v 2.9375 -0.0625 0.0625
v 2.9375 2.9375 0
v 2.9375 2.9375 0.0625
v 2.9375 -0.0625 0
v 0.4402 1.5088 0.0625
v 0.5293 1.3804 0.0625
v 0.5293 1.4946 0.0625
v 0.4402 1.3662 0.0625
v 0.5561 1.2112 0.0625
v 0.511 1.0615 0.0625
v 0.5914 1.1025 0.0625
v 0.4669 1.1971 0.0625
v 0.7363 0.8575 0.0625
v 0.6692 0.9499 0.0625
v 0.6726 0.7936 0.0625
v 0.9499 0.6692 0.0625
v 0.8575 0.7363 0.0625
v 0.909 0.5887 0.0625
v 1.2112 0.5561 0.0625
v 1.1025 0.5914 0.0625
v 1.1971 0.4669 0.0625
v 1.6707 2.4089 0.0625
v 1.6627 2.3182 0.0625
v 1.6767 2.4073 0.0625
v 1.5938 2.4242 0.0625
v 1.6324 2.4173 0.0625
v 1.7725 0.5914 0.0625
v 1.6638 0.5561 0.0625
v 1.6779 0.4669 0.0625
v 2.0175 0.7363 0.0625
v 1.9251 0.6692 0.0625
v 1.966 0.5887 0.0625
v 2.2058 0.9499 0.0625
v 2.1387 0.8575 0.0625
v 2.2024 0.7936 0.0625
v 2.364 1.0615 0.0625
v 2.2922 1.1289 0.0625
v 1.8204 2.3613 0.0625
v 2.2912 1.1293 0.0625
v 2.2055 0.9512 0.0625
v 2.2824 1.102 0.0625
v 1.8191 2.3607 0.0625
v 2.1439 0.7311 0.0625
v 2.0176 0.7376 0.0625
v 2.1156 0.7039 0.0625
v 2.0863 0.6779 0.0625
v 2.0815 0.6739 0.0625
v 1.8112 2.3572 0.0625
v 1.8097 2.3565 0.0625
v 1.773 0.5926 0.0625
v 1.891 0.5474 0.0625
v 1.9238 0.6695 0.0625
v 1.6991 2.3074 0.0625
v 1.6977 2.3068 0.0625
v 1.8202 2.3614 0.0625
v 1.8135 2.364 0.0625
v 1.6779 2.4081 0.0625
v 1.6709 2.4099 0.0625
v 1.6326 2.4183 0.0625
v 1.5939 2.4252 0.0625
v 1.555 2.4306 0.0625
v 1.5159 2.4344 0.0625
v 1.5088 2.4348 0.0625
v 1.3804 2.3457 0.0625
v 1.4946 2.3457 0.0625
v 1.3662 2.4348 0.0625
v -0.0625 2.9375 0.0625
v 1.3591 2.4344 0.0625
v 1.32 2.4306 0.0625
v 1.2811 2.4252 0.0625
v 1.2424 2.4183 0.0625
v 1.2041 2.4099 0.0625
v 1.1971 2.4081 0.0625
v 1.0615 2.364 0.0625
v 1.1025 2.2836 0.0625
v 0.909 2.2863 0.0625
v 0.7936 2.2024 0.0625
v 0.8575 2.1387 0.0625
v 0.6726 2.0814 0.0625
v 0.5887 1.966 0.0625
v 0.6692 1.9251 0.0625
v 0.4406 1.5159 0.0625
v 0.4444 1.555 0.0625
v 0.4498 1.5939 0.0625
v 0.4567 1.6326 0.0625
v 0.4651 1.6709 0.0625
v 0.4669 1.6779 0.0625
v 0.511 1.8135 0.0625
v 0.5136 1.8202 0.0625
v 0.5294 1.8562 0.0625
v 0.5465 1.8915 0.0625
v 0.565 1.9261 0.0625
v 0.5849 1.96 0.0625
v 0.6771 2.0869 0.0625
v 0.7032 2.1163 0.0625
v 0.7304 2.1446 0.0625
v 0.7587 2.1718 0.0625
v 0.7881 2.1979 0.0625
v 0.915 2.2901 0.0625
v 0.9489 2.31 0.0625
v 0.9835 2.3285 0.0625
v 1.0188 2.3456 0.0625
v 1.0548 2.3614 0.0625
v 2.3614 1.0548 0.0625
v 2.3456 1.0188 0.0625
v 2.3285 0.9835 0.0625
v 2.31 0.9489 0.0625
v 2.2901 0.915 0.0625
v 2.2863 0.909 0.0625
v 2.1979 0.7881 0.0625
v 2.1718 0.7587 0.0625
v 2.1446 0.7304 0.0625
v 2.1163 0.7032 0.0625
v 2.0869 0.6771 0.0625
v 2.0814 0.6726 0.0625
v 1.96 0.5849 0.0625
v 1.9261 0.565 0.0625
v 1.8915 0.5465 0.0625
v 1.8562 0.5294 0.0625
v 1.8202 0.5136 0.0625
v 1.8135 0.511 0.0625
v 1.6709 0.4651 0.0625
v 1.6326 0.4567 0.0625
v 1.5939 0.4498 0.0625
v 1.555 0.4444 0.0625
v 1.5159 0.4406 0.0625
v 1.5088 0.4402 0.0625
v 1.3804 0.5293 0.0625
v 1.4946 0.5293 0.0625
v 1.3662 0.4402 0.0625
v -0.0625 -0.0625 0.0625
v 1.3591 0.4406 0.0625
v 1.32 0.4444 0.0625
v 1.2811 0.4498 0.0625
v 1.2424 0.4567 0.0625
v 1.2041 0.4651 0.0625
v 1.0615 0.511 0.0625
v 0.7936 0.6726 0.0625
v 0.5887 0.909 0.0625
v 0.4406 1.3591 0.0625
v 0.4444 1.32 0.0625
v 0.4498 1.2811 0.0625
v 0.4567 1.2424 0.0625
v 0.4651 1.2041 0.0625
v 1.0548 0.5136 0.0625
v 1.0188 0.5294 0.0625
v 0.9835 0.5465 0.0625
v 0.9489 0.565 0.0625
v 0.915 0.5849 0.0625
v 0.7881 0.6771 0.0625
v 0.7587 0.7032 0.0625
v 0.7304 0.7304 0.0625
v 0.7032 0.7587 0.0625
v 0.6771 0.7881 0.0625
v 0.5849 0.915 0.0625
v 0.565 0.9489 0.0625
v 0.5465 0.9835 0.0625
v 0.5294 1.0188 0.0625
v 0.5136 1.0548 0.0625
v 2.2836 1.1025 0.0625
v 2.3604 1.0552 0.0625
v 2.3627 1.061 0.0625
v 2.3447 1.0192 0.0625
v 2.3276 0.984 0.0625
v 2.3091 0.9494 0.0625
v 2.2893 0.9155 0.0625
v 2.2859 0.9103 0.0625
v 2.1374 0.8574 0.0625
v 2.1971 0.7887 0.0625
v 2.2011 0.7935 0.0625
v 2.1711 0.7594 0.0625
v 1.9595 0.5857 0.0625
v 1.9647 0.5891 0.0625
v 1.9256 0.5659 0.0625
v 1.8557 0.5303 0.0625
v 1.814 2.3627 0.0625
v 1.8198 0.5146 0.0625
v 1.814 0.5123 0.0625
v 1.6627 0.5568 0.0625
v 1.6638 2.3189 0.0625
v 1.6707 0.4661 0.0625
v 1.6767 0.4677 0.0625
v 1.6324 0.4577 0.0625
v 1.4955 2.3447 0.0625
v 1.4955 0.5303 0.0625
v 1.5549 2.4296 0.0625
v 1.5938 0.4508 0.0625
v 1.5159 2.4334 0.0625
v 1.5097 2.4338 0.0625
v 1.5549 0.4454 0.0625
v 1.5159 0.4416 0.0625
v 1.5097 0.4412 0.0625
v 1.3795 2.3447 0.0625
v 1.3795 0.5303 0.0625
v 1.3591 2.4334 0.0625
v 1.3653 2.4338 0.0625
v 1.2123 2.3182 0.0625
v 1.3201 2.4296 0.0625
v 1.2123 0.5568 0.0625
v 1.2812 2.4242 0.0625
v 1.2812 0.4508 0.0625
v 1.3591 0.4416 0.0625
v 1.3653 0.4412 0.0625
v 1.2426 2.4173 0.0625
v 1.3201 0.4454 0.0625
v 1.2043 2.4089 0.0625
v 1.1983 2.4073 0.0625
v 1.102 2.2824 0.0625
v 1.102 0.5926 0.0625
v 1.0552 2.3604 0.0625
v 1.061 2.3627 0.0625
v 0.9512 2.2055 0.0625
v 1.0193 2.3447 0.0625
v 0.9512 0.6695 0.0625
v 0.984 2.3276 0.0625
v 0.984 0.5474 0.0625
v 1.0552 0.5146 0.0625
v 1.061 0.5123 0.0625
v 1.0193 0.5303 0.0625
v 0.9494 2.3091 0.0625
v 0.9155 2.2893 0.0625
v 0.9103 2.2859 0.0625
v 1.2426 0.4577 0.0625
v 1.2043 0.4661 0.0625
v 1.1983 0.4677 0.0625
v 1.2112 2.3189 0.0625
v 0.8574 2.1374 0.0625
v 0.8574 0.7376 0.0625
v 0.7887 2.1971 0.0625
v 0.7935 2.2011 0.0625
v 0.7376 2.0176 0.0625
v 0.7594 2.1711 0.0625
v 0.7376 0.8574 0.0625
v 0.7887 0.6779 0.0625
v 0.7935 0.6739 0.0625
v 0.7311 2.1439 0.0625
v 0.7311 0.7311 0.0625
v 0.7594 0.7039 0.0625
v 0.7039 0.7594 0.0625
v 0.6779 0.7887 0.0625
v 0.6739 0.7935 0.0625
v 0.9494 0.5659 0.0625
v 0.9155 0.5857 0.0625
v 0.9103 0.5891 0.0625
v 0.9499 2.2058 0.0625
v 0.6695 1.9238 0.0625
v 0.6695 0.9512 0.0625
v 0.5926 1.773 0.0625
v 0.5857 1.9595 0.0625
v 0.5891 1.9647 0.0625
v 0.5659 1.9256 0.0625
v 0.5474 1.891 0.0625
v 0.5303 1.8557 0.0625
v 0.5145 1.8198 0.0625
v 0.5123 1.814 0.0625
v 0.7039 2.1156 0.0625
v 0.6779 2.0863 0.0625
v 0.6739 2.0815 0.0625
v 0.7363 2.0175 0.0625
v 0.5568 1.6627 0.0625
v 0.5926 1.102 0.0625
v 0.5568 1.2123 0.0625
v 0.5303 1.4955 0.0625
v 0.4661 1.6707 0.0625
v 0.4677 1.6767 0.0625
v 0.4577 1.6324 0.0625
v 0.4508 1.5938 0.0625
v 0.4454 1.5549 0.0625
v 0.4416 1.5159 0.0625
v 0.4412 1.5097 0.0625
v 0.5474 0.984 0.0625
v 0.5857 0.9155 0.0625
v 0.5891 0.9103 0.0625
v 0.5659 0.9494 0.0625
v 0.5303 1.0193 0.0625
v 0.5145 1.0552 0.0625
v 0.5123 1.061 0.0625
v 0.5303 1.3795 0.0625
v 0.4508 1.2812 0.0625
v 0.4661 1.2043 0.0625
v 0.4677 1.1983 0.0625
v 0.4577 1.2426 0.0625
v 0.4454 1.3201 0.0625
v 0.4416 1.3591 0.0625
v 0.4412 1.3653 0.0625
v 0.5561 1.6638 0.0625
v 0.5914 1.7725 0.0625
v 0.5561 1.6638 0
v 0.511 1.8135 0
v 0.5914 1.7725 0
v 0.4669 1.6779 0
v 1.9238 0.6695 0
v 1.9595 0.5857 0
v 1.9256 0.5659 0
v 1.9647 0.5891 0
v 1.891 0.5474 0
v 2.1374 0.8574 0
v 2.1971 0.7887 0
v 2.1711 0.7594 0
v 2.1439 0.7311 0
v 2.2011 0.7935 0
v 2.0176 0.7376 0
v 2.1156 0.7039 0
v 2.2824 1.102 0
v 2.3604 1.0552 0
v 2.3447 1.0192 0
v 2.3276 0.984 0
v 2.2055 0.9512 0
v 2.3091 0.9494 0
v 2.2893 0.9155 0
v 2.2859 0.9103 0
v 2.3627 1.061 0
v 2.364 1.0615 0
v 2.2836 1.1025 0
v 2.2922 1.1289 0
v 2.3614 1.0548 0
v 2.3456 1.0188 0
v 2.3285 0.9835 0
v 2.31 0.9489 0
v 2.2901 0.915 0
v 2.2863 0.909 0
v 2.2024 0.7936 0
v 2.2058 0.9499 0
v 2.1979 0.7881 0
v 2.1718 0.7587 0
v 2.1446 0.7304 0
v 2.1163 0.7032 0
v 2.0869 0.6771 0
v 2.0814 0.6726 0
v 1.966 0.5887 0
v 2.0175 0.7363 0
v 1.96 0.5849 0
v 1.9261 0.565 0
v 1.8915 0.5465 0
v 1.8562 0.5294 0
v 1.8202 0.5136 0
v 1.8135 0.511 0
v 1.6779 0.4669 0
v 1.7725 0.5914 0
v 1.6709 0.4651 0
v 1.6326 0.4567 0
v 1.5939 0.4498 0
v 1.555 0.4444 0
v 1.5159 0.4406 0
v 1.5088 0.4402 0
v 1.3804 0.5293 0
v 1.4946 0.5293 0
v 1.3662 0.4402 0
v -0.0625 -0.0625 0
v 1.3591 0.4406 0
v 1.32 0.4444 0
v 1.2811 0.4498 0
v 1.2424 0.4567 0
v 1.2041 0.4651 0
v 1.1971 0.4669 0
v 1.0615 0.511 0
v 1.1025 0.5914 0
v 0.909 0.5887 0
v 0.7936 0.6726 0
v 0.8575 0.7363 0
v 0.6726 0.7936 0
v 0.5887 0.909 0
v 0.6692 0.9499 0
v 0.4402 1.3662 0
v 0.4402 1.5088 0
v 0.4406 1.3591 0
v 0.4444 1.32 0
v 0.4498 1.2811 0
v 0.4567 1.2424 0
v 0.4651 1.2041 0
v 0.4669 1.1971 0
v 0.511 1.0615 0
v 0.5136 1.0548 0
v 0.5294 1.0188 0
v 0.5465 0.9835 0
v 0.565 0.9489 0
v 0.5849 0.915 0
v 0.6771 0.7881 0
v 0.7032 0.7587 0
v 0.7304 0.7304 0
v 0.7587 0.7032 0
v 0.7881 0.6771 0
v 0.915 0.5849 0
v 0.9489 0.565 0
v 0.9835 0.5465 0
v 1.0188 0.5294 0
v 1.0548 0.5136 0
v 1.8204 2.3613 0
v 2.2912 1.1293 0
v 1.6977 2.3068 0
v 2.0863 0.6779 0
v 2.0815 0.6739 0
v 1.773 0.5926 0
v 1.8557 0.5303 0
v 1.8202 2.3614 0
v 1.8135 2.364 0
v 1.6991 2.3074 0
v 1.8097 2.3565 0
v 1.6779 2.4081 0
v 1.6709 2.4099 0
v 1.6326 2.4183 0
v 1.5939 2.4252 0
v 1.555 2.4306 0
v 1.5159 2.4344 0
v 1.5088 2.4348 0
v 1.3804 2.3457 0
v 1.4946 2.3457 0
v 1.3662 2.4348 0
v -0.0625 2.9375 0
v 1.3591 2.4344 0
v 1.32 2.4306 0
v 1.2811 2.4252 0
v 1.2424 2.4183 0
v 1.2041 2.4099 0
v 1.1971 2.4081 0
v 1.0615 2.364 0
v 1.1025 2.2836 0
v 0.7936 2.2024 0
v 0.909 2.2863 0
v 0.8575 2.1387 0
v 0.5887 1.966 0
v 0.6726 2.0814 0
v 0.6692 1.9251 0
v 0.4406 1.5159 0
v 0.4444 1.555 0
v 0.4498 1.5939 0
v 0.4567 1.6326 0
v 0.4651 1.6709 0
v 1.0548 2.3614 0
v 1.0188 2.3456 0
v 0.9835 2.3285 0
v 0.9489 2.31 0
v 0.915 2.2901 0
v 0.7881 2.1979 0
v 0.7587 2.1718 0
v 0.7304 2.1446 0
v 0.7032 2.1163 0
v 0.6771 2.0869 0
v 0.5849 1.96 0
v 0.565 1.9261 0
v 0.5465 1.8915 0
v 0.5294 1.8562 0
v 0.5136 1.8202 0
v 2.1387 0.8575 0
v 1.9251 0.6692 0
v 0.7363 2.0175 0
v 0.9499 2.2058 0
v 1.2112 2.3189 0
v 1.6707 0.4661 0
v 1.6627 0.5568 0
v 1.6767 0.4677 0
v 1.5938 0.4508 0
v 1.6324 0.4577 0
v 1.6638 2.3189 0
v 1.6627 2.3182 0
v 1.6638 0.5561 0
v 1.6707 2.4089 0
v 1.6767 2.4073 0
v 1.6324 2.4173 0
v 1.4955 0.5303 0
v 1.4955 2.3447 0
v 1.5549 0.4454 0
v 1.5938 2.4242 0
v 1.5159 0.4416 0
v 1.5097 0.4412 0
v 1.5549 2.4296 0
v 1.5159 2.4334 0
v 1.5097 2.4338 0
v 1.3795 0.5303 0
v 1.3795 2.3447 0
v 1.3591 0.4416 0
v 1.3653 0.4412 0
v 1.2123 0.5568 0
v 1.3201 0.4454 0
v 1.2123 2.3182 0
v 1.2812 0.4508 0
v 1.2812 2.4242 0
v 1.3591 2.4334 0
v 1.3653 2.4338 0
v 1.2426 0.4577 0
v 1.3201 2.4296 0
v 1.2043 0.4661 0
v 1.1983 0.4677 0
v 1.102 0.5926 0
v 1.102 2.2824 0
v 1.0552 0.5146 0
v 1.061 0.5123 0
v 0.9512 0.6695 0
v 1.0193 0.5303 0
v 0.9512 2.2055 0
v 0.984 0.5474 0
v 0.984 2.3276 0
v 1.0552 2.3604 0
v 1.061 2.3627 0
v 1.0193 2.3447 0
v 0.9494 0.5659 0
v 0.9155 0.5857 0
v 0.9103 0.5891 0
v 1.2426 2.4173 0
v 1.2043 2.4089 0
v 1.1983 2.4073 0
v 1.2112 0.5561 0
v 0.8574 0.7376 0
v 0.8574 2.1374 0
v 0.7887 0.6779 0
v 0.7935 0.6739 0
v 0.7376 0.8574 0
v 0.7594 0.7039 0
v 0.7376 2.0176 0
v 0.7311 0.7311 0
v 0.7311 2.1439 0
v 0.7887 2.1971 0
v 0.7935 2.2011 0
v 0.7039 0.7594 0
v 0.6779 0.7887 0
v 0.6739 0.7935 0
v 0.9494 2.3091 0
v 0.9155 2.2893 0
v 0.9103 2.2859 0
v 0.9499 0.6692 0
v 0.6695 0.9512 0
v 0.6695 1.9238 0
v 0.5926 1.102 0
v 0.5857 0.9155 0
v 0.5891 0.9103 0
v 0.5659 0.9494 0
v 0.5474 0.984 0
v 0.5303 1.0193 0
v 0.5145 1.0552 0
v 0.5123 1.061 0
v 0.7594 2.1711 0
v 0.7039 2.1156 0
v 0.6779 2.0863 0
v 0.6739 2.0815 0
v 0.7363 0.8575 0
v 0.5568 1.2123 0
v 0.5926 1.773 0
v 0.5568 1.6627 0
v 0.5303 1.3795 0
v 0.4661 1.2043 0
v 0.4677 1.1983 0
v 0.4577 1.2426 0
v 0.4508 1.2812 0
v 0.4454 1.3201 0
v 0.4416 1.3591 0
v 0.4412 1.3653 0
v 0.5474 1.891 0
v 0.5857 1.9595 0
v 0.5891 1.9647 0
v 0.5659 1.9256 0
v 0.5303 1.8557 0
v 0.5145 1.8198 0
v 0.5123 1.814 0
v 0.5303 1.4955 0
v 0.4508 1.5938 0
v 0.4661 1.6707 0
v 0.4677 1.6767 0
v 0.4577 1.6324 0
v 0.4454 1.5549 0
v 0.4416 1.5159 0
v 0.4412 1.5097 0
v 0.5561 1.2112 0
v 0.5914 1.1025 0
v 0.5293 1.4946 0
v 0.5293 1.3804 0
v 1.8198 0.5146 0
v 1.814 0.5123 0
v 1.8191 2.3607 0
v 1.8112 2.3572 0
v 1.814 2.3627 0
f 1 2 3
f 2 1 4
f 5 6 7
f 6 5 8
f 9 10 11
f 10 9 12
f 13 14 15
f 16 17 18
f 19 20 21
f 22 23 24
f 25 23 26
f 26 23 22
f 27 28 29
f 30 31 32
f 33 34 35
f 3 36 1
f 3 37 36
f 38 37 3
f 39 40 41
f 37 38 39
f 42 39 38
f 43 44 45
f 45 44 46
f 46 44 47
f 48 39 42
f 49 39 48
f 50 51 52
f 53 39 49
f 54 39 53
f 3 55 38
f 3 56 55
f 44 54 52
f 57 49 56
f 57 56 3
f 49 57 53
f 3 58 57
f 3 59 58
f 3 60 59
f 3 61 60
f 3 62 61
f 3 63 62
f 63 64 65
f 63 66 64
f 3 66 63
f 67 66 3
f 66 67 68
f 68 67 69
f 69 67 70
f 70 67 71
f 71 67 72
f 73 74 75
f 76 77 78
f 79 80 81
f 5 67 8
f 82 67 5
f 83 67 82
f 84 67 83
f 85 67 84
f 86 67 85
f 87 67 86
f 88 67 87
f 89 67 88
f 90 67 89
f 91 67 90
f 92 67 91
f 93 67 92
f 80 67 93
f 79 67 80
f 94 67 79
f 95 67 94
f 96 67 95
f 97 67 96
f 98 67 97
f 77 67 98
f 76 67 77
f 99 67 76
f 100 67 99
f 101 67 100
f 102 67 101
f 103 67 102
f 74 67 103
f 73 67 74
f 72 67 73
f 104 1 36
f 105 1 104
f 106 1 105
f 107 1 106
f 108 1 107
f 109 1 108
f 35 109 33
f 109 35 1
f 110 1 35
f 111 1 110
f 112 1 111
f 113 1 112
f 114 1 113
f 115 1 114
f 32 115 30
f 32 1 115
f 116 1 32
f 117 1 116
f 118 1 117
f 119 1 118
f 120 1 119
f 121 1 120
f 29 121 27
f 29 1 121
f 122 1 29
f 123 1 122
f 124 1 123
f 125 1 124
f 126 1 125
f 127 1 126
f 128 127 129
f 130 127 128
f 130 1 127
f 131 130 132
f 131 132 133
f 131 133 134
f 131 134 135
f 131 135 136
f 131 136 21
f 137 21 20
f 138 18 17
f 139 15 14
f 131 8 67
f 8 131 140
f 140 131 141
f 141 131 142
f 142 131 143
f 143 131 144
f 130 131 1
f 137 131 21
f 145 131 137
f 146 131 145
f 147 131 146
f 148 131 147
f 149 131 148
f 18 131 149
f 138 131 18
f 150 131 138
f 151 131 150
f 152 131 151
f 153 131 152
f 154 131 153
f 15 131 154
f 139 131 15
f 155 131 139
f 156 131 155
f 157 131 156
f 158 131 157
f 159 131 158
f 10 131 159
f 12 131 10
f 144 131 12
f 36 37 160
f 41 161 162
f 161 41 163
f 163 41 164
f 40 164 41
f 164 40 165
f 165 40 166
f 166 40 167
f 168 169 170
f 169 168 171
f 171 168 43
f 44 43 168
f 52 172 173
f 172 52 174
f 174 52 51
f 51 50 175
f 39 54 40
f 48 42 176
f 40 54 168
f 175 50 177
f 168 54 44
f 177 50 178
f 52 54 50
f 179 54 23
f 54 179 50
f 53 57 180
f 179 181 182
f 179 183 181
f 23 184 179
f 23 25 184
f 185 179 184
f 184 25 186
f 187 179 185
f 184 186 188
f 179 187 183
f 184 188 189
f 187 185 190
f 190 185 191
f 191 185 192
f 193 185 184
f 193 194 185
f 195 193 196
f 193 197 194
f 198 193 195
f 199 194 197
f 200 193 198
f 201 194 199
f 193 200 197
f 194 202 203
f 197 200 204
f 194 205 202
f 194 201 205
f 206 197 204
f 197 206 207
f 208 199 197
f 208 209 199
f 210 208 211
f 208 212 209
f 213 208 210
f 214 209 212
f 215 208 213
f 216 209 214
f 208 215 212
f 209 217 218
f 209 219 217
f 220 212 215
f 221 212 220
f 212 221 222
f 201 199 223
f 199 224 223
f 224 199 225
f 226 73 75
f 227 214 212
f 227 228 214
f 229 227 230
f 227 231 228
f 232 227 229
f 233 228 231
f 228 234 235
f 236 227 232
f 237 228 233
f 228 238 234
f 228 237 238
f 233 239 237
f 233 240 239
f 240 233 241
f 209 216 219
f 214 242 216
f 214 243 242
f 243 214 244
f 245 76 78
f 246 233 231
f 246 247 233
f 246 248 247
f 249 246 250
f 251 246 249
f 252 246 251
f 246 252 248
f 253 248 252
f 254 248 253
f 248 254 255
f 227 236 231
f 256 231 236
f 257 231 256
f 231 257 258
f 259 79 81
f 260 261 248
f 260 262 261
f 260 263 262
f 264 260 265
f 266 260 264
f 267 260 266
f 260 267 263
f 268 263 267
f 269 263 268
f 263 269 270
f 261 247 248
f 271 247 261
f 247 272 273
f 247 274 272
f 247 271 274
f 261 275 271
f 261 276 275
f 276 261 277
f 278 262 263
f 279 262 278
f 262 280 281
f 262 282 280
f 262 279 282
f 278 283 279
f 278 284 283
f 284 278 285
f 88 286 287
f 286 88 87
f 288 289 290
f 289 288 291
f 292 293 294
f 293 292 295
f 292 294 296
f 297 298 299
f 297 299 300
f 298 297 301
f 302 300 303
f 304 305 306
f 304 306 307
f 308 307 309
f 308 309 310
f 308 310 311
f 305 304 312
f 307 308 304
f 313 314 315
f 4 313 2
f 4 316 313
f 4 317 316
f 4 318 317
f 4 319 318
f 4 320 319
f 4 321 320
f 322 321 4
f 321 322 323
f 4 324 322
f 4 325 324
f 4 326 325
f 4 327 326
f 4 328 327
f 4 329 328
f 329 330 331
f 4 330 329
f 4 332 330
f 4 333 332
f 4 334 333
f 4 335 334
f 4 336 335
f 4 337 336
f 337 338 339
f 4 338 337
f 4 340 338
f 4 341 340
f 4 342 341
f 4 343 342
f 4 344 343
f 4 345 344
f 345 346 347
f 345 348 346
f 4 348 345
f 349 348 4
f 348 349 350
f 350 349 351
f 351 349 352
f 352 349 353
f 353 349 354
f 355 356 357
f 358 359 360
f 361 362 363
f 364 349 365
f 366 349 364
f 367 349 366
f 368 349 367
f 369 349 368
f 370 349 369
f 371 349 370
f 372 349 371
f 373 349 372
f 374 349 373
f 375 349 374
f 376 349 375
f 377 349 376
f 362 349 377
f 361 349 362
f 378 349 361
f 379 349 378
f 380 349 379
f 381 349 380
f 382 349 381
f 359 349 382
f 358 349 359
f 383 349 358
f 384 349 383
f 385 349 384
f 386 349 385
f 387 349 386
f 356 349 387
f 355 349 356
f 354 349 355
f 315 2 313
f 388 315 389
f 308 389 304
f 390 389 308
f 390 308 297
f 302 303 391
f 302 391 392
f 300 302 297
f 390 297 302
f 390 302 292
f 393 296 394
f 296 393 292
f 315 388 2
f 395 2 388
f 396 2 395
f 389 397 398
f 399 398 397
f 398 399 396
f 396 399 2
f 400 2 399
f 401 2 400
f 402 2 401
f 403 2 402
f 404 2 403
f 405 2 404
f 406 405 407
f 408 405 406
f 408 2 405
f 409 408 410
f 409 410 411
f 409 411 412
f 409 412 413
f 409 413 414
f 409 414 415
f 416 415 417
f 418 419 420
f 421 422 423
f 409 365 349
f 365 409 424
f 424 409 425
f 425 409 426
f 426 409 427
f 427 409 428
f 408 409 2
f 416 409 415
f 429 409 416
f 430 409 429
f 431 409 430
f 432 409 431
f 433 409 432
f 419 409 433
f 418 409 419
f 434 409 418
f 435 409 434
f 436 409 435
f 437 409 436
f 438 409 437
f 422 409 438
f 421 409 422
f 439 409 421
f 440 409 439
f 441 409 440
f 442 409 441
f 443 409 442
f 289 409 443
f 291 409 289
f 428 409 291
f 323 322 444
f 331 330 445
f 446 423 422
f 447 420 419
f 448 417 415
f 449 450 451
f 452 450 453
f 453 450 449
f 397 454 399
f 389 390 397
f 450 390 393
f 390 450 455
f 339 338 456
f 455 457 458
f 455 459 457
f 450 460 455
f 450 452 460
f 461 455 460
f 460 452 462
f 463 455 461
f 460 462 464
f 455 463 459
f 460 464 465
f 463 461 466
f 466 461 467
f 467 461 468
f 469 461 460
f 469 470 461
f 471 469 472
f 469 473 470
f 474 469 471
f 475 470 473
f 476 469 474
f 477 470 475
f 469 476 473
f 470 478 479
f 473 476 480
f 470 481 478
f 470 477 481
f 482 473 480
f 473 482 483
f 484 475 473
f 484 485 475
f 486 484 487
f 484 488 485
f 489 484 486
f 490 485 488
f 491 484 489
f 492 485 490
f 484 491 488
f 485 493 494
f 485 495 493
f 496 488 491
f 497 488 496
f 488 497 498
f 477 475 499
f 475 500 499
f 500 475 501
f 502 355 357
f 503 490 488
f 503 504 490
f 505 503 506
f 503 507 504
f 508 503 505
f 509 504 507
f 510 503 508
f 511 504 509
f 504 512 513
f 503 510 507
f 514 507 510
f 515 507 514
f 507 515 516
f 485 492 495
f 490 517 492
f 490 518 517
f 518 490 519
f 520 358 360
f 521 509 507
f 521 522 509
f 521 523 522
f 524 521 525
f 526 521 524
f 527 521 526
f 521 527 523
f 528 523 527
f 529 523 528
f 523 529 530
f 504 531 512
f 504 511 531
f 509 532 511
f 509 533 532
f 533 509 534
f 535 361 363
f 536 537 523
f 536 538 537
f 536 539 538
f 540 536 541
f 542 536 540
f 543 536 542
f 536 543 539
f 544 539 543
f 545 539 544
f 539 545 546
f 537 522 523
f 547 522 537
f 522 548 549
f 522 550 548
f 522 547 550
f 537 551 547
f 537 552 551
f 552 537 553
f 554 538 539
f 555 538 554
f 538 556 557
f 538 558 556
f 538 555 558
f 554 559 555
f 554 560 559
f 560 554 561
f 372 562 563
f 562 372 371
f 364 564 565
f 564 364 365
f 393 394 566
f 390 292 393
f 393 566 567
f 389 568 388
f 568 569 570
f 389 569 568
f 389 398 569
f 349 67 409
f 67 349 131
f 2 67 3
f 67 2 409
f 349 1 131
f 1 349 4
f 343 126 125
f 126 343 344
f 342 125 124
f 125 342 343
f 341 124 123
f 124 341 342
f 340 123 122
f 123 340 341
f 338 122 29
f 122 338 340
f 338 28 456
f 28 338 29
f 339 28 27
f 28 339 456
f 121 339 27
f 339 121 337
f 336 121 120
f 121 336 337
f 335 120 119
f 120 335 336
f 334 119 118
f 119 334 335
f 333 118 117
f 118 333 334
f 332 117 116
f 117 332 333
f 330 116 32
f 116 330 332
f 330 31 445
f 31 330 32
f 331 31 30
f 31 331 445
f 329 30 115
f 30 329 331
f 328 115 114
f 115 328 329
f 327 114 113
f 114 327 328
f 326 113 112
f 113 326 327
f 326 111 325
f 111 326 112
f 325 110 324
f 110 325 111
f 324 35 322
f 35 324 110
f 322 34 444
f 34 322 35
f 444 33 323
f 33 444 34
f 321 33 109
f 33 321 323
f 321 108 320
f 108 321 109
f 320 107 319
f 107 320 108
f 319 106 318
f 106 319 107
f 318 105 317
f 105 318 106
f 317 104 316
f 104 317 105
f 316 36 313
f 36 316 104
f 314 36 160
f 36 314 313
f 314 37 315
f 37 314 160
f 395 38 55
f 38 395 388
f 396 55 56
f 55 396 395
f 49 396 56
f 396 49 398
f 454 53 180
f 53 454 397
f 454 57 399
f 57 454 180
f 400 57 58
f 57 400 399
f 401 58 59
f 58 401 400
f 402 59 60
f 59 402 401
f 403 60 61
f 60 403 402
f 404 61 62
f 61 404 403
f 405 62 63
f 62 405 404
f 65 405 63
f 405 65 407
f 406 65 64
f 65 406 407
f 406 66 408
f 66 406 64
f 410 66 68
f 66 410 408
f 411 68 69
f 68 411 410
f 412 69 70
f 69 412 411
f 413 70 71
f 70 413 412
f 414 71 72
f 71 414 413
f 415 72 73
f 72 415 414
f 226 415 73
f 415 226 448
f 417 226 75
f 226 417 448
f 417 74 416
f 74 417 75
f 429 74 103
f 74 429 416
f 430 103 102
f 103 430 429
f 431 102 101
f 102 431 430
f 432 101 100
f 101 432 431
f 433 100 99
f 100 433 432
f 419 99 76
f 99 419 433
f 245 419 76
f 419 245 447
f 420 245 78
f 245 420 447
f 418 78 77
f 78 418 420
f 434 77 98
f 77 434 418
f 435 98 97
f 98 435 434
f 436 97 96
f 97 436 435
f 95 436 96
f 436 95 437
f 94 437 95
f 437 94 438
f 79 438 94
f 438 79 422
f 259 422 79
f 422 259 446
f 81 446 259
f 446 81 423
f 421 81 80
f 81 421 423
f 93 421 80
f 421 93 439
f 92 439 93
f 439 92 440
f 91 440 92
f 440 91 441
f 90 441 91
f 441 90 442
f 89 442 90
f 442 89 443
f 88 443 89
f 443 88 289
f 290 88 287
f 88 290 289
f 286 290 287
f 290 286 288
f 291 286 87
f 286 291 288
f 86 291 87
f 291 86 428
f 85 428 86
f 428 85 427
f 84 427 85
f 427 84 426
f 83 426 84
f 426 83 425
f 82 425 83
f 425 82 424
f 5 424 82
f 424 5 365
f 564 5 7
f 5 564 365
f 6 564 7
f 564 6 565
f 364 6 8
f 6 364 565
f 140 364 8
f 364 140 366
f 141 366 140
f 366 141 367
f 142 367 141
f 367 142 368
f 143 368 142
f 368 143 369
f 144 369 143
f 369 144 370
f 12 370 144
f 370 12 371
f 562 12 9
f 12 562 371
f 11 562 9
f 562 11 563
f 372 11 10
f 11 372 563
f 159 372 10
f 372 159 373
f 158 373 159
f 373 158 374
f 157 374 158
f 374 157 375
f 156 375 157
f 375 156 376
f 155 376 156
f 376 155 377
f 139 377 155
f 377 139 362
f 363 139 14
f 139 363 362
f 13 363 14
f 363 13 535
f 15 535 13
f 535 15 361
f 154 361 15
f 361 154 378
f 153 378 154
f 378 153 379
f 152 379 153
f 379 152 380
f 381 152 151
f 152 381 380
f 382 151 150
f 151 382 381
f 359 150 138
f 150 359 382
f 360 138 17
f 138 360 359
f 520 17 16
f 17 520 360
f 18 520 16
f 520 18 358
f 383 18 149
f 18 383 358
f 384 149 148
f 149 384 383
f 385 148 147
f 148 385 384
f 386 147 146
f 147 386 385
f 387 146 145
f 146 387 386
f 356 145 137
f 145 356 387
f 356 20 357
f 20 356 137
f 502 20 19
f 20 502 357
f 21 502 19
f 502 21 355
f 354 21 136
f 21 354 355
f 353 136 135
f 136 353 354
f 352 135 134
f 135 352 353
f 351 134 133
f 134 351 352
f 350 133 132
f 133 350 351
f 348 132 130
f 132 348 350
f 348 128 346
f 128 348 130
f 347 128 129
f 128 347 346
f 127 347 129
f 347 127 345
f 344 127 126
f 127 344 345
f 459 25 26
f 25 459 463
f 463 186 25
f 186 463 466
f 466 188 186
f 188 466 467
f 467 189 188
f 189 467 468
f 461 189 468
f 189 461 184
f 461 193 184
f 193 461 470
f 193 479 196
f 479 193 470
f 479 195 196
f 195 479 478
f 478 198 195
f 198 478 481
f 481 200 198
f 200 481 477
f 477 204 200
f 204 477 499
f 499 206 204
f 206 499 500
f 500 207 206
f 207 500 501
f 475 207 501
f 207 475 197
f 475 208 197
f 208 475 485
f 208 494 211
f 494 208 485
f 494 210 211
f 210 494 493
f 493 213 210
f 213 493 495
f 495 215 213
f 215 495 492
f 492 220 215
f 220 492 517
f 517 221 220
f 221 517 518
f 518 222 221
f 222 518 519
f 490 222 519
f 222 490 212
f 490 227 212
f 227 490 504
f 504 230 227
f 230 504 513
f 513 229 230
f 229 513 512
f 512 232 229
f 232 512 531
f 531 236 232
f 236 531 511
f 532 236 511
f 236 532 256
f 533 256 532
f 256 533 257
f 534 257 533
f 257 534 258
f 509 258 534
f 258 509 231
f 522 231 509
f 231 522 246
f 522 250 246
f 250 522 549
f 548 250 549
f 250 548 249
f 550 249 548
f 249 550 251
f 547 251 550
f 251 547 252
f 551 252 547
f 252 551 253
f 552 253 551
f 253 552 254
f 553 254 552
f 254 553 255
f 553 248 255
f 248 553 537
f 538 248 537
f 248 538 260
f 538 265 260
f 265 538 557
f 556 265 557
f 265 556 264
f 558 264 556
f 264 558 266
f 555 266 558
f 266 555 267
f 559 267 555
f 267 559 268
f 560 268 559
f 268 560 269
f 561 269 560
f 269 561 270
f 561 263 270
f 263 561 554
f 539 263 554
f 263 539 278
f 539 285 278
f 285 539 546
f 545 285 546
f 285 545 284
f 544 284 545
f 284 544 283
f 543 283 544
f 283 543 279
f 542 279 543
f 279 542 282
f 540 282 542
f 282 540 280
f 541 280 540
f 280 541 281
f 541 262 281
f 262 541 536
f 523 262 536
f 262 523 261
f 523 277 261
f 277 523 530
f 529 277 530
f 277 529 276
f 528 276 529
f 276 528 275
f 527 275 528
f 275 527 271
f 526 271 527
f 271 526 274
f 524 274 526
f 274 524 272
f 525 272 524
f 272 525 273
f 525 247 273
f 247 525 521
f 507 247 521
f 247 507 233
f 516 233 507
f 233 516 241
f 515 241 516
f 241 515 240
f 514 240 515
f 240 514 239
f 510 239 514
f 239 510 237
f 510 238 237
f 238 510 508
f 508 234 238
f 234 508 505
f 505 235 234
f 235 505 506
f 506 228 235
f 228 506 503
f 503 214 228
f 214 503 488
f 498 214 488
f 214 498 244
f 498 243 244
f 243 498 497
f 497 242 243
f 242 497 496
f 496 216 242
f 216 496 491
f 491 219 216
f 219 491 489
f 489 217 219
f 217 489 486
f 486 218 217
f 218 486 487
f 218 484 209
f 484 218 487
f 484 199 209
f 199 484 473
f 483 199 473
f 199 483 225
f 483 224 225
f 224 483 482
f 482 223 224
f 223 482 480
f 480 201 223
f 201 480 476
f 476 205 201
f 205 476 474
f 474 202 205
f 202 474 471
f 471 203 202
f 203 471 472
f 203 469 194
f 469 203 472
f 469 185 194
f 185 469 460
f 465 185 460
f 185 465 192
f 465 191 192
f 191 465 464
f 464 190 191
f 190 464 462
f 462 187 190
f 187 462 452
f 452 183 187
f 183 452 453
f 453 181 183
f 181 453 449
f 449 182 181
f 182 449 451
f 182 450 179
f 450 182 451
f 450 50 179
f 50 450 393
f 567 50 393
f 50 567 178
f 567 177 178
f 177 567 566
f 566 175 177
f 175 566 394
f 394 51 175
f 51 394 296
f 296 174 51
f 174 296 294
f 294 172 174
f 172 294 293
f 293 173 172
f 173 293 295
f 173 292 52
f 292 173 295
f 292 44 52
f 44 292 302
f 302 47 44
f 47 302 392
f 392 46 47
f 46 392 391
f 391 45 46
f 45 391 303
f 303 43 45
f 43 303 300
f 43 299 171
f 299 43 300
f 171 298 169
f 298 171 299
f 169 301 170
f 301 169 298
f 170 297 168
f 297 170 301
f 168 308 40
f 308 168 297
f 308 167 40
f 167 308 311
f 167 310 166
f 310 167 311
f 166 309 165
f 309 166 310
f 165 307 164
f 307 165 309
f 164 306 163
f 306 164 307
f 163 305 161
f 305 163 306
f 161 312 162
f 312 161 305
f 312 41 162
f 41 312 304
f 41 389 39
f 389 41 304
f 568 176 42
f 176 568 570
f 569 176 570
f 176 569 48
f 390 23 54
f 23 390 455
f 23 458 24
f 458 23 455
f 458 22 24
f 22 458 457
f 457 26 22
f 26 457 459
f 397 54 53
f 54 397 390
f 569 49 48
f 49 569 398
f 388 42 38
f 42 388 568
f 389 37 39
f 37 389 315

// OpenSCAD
// file: sub_innergears.scad
// sub_innergears.scad — shared inner gear ring (ring with inward-pointing teeth)
// Requires caller to define: plate_w, plate_d, plate_h (see sub_base_plate.scad)
// Units: inches
//
// Usage — must be `include`, positioned after sub_base_plate.scad and before any
// code that references gear_r_tip/gear_r_root/gear_r_bore:
//   include <sub_base_plate.scad>
//   include <sub_innergears.scad>
//   gear("darkred");
//   gear_bore("lightgray");
//
// gear(c) and gear_bore(c) take a color string so tiles with different gear
// colors (e.g. darkred vs darkgreen) can share this same file.

gear_r_tip  = 1.18;   // outer edge of ring (plain)
gear_r_root = 1.00;   // ring inner edge; teeth root here
gear_r_bore = 0.82;   // bore radius / tooth tip depth
gear_n      = 20;
tooth_hw    = 4.5;
tooth_tip_f = 0.80;

// ── Gear 2D helpers ───────────────────────────────────────────────────────────

module gear_tooth_2d() {
    shift   = (gear_r_root - gear_r_bore) / 2;
    r_outer = gear_r_root + shift;
    r_inner = gear_r_bore + shift;
    polygon([
        [r_outer * cos(-tooth_hw),               r_outer * sin(-tooth_hw)],
        [r_inner * cos(-tooth_hw * tooth_tip_f),  r_inner * sin(-tooth_hw * tooth_tip_f)],
        [r_inner * cos( tooth_hw * tooth_tip_f),  r_inner * sin( tooth_hw * tooth_tip_f)],
        [r_outer * cos( tooth_hw),               r_outer * sin( tooth_hw)],
    ]);
}

module gear_2d() {
    circle(r = gear_r_tip, $fn = 160);
}

module bore_2d() {
    pitch = 360 / gear_n;
    difference() {
        circle(r = gear_r_root, $fn = 160);
        for (i = [0:gear_n - 1]) rotate([0, 0, i * pitch]) gear_tooth_2d();
    }
}

// ── Gear holes & gear ────────────────────────────────────────────────────────

module gear_holes() {
    translate([plate_w / 2, plate_d / 2, -1])
    linear_extrude(plate_h + 2)
    difference() {
        gear_2d();
        bore_2d();
    }
}

module gear(c) {
    color(c)
    translate([plate_w / 2, plate_d / 2, 0])
    linear_extrude(plate_h)
    difference() { gear_2d(); bore_2d(); }
}

// ── Gear bore hole & gear bore ────────────────────────────────────────────────

module gear_bore_holes() {
    translate([plate_w / 2, plate_d / 2, -1])
    linear_extrude(plate_h + 2)
    bore_2d();
}

module gear_bore(c) {
    color(c)
    translate([plate_w / 2, plate_d / 2, 0])
    linear_extrude(plate_h)
    offset(delta = -0.001) bore_2d();
}
// file: sub_base_plate.scad
// sub_base_plate.scad — shared tile-building blocks: plate, rivets, edge ID marks,
// and the common plate/hole dimensional constants used by every tile.
// Units: inches
//
// Usage — must be `include`, not `use`, and the include line must come
// before any code in the caller that references plate_w/plate_d/plate_h/
// frame_w/hole_d/hole_r: a variable defined only inside an included file is
// invisible to code positioned before the include statement.
//   include <sub_base_plate.scad>
//   plate(["red", undef, "blue", undef, undef, "green"]);
//
// plate(colors) is the main entry point: it builds the complete base tile in
// one call — the frame with edge ID marks, the darkgray plate, and the
// lightgray rivet ring (40 rivets, 10 per side, corners shared). colors is the
// same 6-slot frame_with_id() array described below.
//
// frame_with_id() colors are applied left-to-right (−x to +x), repeated
// identically on all four edges. Bottom and right edges read the array in
// reverse (slot 5-i) so the pattern stays consistent when the tile is flipped.
// Any position left as undef or omitted defaults to black. 6 regions span the
// straight run of each edge (corners always stay solid black). A thin black
// layer covers the marks on the top face; marks are visible from the edge.

plate_w = 2 + 7/8;
plate_d = 2 + 7/8;
plate_h = 1/16;
frame_w = 1/16;
hole_d  = 3/32;
hole_r  = hole_d / 2;

module rivet_holes() {
    spacing_x = plate_w / 10;
    spacing_y = plate_d / 10;
    inset_x   = spacing_x / 2;
    inset_y   = spacing_y / 2;
    for (i = [0:9]) translate([inset_x + i * spacing_x, inset_y,           -1]) cylinder(h = plate_h + 2, r = hole_r, $fn = 20);
    for (i = [0:9]) translate([inset_x + i * spacing_x, plate_d - inset_y, -1]) cylinder(h = plate_h + 2, r = hole_r, $fn = 20);
    for (i = [0:9]) translate([inset_x,           inset_y + i * spacing_y, -1]) cylinder(h = plate_h + 2, r = hole_r, $fn = 20);
    for (i = [0:9]) translate([plate_w - inset_x, inset_y + i * spacing_y, -1]) cylinder(h = plate_h + 2, r = hole_r, $fn = 20);
}

module rivets() {
    spacing_x = plate_w / 10;
    spacing_y = plate_d / 10;
    inset_x   = spacing_x / 2;
    inset_y   = spacing_y / 2;
    color("lightgray") {
        for (i = [0:9]) translate([inset_x + i * spacing_x, inset_y,           0]) cylinder(h = plate_h, r = hole_r, $fn = 20);
        for (i = [0:9]) translate([inset_x + i * spacing_x, plate_d - inset_y, 0]) cylinder(h = plate_h, r = hole_r, $fn = 20);
        for (i = [0:9]) translate([inset_x,           inset_y + i * spacing_y, 0]) cylinder(h = plate_h, r = hole_r, $fn = 20);
        for (i = [0:9]) translate([plate_w - inset_x, inset_y + i * spacing_y, 0]) cylinder(h = plate_h, r = hole_r, $fn = 20);
    }
}

module frame_with_id(colors = []) {
    id_cover = plate_h / 8;
    region_w = plate_w / 6;
    region_d = plate_d / 6;
    mark_h   = plate_h - id_cover;

    color("black")
    difference() {
        translate([-frame_w, -frame_w, 0])
            cube([plate_w + 2 * frame_w, plate_d + 2 * frame_w, plate_h]);
        translate([0, 0, -0.001])
            cube([plate_w, plate_d, plate_h + 0.002]);
        // top/bottom/left/right straight runs only — corners stay solid black
        translate([0, plate_d - 0.001, -0.001])
            cube([plate_w, frame_w + 0.002, plate_h + 0.002]);
        translate([0, -frame_w - 0.001, -0.001])
            cube([plate_w, frame_w + 0.002, plate_h + 0.002]);
        translate([-frame_w - 0.001, 0, -0.001])
            cube([frame_w + 0.002, plate_d, plate_h + 0.002]);
        translate([plate_w - 0.001, 0, -0.001])
            cube([frame_w + 0.002, plate_d, plate_h + 0.002]);
    }

    for (i = [0:5]) {
        c     = (colors[i] != undef) ? colors[i] : "black";

        // top edge
        color(c) translate([i * region_w, plate_d, 0]) cube([region_w, frame_w, mark_h]);
        color("black") translate([i * region_w, plate_d, mark_h]) cube([region_w, frame_w, id_cover]);

        // bottom edge (reversed)
        color(c) translate([(5-i) * region_w, -frame_w, 0]) cube([region_w, frame_w, mark_h]);
        color("black") translate([(5-i) * region_w, -frame_w, mark_h]) cube([region_w, frame_w, id_cover]);

        // left edge
        color(c) translate([-frame_w, i * region_d, 0]) cube([frame_w, region_d, mark_h]);
        color("black") translate([-frame_w, i * region_d, mark_h]) cube([frame_w, region_d, id_cover]);

        // right edge (reversed)
        color(c) translate([plate_w, (5-i) * region_d, 0]) cube([frame_w, region_d, mark_h]);
        color("black") translate([plate_w, (5-i) * region_d, mark_h]) cube([frame_w, region_d, id_cover]);
    }
}

module plate(colors = []) {
    frame_with_id(colors);
    union() {
        difference() {
            color("darkgray") cube([plate_w, plate_d, plate_h]);
            rivet_holes();
        }
        rivets();
    }
}
// file: sub_element100.scad
// sub_element100.scad — shared assembly for element100 flag tile variants
// Requires caller to define: plate_colors (6-slot frame color array),
// label_num (number painted on the flag)
// Units: inches

include <sub_base_plate.scad>
include <sub_innergears.scad>

// Pole — same inset_x gap from right rivet column as rivets are from edge
pole_r   = 0.04;
pole_cx  = plate_w - plate_w / 10;
pole_y1  = (plate_d / 20) + hole_r + 0.01;
pole_y2  = plate_d - (plate_d / 20) - hole_r - 0.01;

// Pennant — 2/3 pole height, top at pole top, tip extends well across gear
flag_base_x  = pole_cx;
flag_top_y   = pole_y2;
flag_bot_y   = pole_y2 - (pole_y2 - pole_y1) * 2 / 3;
flag_tip_x   = plate_w / 2 - gear_r_tip * 0.60;
flag_mid_y   = (flag_top_y + flag_bot_y) / 2;
outline_t    = 0.025;

// ── Flag 2D helpers ───────────────────────────────────────────────────────────

module flag_pennant_2d() {
    polygon([
        [flag_base_x, flag_top_y],
        [flag_base_x, flag_bot_y],
        [flag_tip_x,  flag_mid_y]
    ]);
}

module flag_label_2d(label) {
    translate([flag_base_x + (flag_tip_x - flag_base_x) * 0.38, flag_mid_y])
    text(label, size = 0.65, halign = "center", valign = "center",
         font = "Liberation Sans:style=Bold");
}

// ── Flag outline hole & flag outline ─────────────────────────────────────────

module flag_outline_holes() {
    translate([0, 0, -1])
    linear_extrude(plate_h + 2)
    difference() {
        offset(delta = outline_t) flag_pennant_2d();
        flag_pennant_2d();
    }
}

module flag_outline() {
    color("darkgray")
    linear_extrude(plate_h)
    difference() {
        offset(delta = outline_t) flag_pennant_2d();
        flag_pennant_2d();
    }
}

// ── Flag pole hole, flag hole → flag pole, flag ───────────────────────────────

module flag_pole_holes() {
    translate([pole_cx - pole_r, pole_y1, -1])
    cube([pole_r * 2, pole_y2 - pole_y1, plate_h + 2]);
}

module flag_pole() {
    color("red")
    translate([pole_cx - pole_r, pole_y1, 0])
    cube([pole_r * 2, pole_y2 - pole_y1, plate_h]);
}

module flag_holes() {
    translate([0, 0, -1])
    linear_extrude(plate_h + 2)
    flag_pennant_2d();
}

module flag() {
    color("red")
    linear_extrude(plate_h)
    flag_pennant_2d();
}

// ── Label hole → label ────────────────────────────────────────────────────────

module label_holes(label) {
    translate([0, 0, -1])
    linear_extrude(plate_h + 2)
    flag_label_2d(label);
}

module flag_label(label) {
    color("white")
    linear_extrude(plate_h)
    flag_label_2d(label);
}

// ── Assembly ──────────────────────────────────────────────────────────────────
// Each level: difference() cuts the holes INTO the running assembly,
//             union() then adds the feature that fills those holes.
// Innermost = first step; outermost = last step.

union() {                                           // step 5: add label
    difference() {
        union() {                                   // step 4: add flag pole & flag
            difference() {
                union() {                           // step 3: add flag outline
                    difference() {
                        union() {                   // step 2: add gear bore
                            difference() {
                                union() {           // step 1: add gear
                                    difference() {
                                        plate(plate_colors);   // step 0: plate (frame + rivets)
                                        gear_holes();       // cut gear holes
                                    }
                                    gear("darkred");        // fill with gear
                                }
                                gear_bore_holes();          // cut gear bore hole
                            }
                            gear_bore("lightgray");         // fill with gear bore
                        }
                        flag_outline_holes();               // cut flag outline hole
                    }
                    flag_outline();                         // fill with flag outline
                }
                flag_pole_holes();                          // cut flag pole hole
                flag_holes();                               // cut flag hole
            }
            flag_pole();                                    // fill with flag pole
            flag();                                         // fill with flag
        }
        label_holes(label_num);                             // cut label hole
    }
    flag_label(label_num);                                  // fill with label
}
// main file
// element100-3.scad
// Flag square tile variant — gear with pennant flag, number "3" on flag.

plate_colors = ["red", "red", undef, "red", "red", "red"];
label_num    = "3";

include <sub_element100.scad>
